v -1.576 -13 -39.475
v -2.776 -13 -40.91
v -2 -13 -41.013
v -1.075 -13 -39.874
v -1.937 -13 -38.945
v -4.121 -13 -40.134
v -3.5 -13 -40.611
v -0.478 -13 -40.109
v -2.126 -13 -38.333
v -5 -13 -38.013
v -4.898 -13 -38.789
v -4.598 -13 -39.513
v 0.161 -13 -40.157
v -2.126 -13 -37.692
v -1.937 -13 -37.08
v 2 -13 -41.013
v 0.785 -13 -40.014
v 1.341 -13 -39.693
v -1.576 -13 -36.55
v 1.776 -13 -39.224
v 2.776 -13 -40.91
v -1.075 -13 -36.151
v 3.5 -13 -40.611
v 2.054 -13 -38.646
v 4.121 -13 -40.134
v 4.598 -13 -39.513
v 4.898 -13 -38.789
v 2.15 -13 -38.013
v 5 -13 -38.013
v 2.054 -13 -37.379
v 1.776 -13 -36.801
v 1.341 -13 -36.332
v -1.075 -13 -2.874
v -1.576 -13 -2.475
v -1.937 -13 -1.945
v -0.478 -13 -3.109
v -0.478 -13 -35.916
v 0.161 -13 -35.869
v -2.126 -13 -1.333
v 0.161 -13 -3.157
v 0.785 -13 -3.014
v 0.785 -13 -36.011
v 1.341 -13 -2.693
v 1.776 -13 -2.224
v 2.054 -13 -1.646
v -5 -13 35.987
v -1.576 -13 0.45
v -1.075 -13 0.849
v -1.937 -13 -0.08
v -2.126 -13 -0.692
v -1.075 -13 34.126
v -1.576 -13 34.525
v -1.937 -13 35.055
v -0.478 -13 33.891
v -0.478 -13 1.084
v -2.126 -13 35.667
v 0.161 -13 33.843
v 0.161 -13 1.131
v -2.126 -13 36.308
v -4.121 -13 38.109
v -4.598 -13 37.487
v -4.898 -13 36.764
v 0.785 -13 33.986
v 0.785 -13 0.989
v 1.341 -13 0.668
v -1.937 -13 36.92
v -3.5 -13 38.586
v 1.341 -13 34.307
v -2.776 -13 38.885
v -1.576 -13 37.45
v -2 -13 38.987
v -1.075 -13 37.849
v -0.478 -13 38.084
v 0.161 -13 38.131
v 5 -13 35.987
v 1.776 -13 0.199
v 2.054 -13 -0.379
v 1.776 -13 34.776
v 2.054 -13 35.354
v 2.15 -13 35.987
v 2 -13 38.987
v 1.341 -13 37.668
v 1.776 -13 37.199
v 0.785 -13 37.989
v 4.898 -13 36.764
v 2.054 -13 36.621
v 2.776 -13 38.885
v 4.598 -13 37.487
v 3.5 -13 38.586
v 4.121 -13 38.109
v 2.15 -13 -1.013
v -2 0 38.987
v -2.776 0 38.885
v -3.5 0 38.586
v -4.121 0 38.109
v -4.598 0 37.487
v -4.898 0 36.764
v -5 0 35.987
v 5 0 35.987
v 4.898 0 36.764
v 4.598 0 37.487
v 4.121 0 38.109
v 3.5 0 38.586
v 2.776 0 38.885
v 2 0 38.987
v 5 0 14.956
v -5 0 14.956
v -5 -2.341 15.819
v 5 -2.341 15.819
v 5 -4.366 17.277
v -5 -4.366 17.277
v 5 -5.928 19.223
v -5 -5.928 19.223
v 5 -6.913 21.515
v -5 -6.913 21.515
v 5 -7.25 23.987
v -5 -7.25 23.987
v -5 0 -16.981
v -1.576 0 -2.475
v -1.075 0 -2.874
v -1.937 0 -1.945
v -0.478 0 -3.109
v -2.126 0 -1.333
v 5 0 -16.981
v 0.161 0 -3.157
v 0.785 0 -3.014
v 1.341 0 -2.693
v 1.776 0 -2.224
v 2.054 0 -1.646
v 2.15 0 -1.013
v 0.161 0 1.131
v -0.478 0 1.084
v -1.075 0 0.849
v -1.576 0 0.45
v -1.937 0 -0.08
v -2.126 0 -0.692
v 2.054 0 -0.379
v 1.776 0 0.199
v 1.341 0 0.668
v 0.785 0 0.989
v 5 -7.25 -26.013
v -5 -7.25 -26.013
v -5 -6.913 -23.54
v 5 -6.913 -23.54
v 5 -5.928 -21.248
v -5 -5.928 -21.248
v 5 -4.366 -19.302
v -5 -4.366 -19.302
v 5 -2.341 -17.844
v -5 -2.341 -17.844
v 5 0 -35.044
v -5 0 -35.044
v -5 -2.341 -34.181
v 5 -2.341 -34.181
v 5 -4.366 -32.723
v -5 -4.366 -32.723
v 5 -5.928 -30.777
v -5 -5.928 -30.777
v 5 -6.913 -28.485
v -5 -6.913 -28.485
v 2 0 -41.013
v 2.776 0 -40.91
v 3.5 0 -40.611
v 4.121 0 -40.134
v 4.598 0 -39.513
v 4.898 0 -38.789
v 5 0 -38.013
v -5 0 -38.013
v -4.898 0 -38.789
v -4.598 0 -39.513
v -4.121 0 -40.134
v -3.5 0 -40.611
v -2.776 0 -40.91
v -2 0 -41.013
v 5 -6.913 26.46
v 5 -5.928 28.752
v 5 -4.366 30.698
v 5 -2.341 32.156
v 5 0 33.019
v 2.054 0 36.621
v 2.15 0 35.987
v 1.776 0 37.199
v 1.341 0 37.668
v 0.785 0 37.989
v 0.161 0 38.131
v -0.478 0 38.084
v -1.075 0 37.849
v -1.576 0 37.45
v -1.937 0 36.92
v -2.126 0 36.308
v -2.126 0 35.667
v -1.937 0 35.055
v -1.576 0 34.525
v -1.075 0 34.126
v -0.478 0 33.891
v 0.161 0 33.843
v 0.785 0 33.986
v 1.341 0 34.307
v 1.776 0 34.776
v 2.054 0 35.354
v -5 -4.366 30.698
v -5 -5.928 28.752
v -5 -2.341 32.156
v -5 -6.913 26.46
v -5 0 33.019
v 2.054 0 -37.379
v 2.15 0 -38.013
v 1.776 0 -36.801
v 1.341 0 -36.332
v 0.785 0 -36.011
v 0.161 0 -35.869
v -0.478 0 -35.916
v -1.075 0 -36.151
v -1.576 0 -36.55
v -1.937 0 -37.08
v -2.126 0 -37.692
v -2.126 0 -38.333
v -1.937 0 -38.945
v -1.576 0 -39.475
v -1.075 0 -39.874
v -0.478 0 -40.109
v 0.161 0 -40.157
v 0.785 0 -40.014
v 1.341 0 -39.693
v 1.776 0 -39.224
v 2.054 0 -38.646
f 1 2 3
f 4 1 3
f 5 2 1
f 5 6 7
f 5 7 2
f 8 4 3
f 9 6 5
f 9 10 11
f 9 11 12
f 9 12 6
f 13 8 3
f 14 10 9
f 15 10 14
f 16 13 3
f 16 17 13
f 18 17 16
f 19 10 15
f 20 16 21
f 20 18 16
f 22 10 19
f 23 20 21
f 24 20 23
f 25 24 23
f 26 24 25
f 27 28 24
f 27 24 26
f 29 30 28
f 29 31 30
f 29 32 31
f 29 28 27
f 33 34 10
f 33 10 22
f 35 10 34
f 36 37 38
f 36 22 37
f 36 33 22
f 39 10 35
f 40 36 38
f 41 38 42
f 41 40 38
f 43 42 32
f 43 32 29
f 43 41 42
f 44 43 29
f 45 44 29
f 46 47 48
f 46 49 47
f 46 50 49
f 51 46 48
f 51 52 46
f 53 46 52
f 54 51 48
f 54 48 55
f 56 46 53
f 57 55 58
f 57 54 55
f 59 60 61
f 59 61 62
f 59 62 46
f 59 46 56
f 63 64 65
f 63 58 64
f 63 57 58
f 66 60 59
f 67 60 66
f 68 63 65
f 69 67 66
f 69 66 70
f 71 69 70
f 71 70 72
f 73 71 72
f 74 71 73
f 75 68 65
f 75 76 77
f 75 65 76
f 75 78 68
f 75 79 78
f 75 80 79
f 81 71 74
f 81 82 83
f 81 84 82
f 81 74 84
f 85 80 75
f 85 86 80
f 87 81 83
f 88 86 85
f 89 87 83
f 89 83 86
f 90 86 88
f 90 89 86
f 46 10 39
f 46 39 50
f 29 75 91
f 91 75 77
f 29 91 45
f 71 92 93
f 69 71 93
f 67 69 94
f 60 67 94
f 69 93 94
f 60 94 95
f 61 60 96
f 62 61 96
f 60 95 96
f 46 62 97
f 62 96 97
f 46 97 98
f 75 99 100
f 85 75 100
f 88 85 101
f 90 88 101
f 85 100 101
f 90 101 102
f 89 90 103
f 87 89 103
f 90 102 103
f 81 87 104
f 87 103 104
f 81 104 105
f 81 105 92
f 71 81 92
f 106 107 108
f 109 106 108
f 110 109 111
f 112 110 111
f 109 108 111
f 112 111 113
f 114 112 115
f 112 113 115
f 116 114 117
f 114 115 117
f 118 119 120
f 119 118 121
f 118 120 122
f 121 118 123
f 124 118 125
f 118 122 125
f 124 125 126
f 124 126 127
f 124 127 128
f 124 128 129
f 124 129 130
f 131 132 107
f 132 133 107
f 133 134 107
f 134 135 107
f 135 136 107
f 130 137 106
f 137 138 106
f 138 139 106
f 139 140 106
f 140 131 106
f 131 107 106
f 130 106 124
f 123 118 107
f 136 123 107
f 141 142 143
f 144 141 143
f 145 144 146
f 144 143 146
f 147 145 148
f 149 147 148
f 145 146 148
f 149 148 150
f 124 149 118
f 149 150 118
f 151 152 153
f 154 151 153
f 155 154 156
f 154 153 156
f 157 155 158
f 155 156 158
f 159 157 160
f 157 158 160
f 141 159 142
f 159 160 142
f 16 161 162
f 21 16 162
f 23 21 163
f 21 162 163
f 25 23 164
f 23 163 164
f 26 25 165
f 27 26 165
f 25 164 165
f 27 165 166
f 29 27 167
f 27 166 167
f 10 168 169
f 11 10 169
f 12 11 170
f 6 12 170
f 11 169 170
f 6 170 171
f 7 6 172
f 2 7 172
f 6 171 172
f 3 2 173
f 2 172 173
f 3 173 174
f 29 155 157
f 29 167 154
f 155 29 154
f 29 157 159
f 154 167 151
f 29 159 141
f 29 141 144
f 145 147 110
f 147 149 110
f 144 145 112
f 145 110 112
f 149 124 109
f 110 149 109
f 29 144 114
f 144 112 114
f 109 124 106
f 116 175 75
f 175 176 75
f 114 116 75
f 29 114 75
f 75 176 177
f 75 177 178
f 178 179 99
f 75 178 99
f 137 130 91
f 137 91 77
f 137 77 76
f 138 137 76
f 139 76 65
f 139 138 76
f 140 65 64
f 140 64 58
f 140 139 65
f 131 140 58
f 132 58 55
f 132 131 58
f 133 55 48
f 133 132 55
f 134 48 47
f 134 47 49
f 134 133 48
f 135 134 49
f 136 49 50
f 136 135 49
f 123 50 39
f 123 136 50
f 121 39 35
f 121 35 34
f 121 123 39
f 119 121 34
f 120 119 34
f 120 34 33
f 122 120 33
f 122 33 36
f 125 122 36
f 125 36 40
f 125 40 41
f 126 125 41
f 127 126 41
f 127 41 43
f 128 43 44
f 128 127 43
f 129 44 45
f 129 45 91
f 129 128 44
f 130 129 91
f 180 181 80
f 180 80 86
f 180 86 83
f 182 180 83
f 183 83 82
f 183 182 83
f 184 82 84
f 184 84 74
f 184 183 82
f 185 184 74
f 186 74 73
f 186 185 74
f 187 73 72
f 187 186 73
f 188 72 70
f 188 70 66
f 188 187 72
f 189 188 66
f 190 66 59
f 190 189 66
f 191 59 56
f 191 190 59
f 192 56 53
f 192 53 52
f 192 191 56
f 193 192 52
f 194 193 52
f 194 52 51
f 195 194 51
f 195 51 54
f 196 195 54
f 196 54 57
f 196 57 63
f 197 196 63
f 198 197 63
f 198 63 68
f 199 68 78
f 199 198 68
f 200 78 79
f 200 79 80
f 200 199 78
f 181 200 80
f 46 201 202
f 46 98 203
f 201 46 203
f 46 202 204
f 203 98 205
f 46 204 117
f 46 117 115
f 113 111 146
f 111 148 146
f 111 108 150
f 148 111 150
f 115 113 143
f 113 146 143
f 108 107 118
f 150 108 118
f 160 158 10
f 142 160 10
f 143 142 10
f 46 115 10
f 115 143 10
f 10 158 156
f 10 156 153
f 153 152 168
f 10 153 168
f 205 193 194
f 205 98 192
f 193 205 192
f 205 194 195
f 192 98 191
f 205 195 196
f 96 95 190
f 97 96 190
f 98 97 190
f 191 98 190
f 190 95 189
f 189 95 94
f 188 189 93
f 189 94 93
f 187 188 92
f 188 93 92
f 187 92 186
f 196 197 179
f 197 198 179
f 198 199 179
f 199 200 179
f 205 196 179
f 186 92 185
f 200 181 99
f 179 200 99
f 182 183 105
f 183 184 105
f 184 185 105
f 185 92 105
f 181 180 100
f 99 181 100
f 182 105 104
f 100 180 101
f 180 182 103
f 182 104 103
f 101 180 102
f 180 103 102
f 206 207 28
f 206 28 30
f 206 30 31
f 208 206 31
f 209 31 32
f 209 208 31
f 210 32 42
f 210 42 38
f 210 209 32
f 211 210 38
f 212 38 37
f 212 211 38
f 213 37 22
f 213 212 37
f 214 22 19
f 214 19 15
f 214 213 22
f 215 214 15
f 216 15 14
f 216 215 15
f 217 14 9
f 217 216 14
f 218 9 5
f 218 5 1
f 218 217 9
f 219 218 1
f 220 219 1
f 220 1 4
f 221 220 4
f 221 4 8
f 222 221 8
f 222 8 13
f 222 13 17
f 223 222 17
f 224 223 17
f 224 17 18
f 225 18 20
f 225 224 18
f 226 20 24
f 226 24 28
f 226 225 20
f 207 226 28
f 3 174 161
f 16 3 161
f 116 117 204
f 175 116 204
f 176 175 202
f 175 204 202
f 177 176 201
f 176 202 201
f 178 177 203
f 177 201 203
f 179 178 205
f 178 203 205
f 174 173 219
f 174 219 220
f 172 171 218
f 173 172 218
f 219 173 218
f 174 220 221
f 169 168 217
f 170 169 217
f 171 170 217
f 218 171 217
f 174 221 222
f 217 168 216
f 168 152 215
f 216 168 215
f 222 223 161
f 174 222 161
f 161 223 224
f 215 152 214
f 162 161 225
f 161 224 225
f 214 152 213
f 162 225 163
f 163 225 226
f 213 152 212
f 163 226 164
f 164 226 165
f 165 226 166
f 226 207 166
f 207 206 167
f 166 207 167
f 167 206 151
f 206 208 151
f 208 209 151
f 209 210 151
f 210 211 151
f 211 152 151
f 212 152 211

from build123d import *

# Parameters (mm, degrees)
F0_R     = 2.15
F1_DEPTH = 13
F3_DEPTH = 25


# Not quite as in the source:
# - a feature names something its author has since deleted; it is built from what else it names


with BuildPart() as f1:
    # F0 (on Front) → F1 (new body)
    with BuildSketch(Plane.XZ):
        with BuildLine():
            Line((2, 38.987471127), (-2, 38.987471127))
            ThreePointArc((-2, 38.987471127), (-4.1213203436, 38.1087914705), (-5, 35.987471127))
            Line((-5, 35.987471127), (-5, -38.012528873))
            ThreePointArc((-5, -38.012528873), (-4.1213203436, -40.1338492166), (-2, -41.012528873))
            Line((-2, -41.012528873), (2, -41.012528873))
            ThreePointArc((2, -41.012528873), (4.1213203436, -40.1338492166), (5, -38.012528873))
            Line((5, -38.012528873), (5, 35.987471127))
            ThreePointArc((5, 35.987471127), (4.1213203436, 38.1087914705), (2, 38.987471127))
        make_face()
        with Locations((0, -38.012528873)):
            Circle(F0_R, mode=Mode.SUBTRACT)
        with Locations((0, -1.012528873)):
            Circle(F0_R, mode=Mode.SUBTRACT)
        with Locations((0, 35.987471127)):
            Circle(F0_R, mode=Mode.SUBTRACT)
    extrude(amount=F1_DEPTH)

    # F2 (on face) → F3 (cut)
    with BuildSketch(Plane(origin=(-5, 0, 0), x_dir=(0, -1, 0), z_dir=(-1, 0, 0))):
        with BuildLine():
            ThreePointArc((0, 14.9562751929), (5.2132690231, 18.196853716), (7.25, 23.987471127))
            ThreePointArc((7.25, 23.987471127), (5.2132690231, 29.7780885379), (0, 33.0186670611))
            Line((0, 33.0186670611), (0, 23.987471127))
            Line((0, 23.987471127), (0, 14.9562751929))
        make_face()
        with BuildLine():
            ThreePointArc((7.25, -26.012528873), (5.2132690231, -20.2219114621), (0, -16.9813329389))
            Line((0, -16.9813329389), (0, -35.0437248071))
            ThreePointArc((0, -35.0437248071), (5.2132690231, -31.803146284), (7.25, -26.012528873))
        make_face()
    extrude(amount=-F3_DEPTH, mode=Mode.SUBTRACT)


solid = f1.part
